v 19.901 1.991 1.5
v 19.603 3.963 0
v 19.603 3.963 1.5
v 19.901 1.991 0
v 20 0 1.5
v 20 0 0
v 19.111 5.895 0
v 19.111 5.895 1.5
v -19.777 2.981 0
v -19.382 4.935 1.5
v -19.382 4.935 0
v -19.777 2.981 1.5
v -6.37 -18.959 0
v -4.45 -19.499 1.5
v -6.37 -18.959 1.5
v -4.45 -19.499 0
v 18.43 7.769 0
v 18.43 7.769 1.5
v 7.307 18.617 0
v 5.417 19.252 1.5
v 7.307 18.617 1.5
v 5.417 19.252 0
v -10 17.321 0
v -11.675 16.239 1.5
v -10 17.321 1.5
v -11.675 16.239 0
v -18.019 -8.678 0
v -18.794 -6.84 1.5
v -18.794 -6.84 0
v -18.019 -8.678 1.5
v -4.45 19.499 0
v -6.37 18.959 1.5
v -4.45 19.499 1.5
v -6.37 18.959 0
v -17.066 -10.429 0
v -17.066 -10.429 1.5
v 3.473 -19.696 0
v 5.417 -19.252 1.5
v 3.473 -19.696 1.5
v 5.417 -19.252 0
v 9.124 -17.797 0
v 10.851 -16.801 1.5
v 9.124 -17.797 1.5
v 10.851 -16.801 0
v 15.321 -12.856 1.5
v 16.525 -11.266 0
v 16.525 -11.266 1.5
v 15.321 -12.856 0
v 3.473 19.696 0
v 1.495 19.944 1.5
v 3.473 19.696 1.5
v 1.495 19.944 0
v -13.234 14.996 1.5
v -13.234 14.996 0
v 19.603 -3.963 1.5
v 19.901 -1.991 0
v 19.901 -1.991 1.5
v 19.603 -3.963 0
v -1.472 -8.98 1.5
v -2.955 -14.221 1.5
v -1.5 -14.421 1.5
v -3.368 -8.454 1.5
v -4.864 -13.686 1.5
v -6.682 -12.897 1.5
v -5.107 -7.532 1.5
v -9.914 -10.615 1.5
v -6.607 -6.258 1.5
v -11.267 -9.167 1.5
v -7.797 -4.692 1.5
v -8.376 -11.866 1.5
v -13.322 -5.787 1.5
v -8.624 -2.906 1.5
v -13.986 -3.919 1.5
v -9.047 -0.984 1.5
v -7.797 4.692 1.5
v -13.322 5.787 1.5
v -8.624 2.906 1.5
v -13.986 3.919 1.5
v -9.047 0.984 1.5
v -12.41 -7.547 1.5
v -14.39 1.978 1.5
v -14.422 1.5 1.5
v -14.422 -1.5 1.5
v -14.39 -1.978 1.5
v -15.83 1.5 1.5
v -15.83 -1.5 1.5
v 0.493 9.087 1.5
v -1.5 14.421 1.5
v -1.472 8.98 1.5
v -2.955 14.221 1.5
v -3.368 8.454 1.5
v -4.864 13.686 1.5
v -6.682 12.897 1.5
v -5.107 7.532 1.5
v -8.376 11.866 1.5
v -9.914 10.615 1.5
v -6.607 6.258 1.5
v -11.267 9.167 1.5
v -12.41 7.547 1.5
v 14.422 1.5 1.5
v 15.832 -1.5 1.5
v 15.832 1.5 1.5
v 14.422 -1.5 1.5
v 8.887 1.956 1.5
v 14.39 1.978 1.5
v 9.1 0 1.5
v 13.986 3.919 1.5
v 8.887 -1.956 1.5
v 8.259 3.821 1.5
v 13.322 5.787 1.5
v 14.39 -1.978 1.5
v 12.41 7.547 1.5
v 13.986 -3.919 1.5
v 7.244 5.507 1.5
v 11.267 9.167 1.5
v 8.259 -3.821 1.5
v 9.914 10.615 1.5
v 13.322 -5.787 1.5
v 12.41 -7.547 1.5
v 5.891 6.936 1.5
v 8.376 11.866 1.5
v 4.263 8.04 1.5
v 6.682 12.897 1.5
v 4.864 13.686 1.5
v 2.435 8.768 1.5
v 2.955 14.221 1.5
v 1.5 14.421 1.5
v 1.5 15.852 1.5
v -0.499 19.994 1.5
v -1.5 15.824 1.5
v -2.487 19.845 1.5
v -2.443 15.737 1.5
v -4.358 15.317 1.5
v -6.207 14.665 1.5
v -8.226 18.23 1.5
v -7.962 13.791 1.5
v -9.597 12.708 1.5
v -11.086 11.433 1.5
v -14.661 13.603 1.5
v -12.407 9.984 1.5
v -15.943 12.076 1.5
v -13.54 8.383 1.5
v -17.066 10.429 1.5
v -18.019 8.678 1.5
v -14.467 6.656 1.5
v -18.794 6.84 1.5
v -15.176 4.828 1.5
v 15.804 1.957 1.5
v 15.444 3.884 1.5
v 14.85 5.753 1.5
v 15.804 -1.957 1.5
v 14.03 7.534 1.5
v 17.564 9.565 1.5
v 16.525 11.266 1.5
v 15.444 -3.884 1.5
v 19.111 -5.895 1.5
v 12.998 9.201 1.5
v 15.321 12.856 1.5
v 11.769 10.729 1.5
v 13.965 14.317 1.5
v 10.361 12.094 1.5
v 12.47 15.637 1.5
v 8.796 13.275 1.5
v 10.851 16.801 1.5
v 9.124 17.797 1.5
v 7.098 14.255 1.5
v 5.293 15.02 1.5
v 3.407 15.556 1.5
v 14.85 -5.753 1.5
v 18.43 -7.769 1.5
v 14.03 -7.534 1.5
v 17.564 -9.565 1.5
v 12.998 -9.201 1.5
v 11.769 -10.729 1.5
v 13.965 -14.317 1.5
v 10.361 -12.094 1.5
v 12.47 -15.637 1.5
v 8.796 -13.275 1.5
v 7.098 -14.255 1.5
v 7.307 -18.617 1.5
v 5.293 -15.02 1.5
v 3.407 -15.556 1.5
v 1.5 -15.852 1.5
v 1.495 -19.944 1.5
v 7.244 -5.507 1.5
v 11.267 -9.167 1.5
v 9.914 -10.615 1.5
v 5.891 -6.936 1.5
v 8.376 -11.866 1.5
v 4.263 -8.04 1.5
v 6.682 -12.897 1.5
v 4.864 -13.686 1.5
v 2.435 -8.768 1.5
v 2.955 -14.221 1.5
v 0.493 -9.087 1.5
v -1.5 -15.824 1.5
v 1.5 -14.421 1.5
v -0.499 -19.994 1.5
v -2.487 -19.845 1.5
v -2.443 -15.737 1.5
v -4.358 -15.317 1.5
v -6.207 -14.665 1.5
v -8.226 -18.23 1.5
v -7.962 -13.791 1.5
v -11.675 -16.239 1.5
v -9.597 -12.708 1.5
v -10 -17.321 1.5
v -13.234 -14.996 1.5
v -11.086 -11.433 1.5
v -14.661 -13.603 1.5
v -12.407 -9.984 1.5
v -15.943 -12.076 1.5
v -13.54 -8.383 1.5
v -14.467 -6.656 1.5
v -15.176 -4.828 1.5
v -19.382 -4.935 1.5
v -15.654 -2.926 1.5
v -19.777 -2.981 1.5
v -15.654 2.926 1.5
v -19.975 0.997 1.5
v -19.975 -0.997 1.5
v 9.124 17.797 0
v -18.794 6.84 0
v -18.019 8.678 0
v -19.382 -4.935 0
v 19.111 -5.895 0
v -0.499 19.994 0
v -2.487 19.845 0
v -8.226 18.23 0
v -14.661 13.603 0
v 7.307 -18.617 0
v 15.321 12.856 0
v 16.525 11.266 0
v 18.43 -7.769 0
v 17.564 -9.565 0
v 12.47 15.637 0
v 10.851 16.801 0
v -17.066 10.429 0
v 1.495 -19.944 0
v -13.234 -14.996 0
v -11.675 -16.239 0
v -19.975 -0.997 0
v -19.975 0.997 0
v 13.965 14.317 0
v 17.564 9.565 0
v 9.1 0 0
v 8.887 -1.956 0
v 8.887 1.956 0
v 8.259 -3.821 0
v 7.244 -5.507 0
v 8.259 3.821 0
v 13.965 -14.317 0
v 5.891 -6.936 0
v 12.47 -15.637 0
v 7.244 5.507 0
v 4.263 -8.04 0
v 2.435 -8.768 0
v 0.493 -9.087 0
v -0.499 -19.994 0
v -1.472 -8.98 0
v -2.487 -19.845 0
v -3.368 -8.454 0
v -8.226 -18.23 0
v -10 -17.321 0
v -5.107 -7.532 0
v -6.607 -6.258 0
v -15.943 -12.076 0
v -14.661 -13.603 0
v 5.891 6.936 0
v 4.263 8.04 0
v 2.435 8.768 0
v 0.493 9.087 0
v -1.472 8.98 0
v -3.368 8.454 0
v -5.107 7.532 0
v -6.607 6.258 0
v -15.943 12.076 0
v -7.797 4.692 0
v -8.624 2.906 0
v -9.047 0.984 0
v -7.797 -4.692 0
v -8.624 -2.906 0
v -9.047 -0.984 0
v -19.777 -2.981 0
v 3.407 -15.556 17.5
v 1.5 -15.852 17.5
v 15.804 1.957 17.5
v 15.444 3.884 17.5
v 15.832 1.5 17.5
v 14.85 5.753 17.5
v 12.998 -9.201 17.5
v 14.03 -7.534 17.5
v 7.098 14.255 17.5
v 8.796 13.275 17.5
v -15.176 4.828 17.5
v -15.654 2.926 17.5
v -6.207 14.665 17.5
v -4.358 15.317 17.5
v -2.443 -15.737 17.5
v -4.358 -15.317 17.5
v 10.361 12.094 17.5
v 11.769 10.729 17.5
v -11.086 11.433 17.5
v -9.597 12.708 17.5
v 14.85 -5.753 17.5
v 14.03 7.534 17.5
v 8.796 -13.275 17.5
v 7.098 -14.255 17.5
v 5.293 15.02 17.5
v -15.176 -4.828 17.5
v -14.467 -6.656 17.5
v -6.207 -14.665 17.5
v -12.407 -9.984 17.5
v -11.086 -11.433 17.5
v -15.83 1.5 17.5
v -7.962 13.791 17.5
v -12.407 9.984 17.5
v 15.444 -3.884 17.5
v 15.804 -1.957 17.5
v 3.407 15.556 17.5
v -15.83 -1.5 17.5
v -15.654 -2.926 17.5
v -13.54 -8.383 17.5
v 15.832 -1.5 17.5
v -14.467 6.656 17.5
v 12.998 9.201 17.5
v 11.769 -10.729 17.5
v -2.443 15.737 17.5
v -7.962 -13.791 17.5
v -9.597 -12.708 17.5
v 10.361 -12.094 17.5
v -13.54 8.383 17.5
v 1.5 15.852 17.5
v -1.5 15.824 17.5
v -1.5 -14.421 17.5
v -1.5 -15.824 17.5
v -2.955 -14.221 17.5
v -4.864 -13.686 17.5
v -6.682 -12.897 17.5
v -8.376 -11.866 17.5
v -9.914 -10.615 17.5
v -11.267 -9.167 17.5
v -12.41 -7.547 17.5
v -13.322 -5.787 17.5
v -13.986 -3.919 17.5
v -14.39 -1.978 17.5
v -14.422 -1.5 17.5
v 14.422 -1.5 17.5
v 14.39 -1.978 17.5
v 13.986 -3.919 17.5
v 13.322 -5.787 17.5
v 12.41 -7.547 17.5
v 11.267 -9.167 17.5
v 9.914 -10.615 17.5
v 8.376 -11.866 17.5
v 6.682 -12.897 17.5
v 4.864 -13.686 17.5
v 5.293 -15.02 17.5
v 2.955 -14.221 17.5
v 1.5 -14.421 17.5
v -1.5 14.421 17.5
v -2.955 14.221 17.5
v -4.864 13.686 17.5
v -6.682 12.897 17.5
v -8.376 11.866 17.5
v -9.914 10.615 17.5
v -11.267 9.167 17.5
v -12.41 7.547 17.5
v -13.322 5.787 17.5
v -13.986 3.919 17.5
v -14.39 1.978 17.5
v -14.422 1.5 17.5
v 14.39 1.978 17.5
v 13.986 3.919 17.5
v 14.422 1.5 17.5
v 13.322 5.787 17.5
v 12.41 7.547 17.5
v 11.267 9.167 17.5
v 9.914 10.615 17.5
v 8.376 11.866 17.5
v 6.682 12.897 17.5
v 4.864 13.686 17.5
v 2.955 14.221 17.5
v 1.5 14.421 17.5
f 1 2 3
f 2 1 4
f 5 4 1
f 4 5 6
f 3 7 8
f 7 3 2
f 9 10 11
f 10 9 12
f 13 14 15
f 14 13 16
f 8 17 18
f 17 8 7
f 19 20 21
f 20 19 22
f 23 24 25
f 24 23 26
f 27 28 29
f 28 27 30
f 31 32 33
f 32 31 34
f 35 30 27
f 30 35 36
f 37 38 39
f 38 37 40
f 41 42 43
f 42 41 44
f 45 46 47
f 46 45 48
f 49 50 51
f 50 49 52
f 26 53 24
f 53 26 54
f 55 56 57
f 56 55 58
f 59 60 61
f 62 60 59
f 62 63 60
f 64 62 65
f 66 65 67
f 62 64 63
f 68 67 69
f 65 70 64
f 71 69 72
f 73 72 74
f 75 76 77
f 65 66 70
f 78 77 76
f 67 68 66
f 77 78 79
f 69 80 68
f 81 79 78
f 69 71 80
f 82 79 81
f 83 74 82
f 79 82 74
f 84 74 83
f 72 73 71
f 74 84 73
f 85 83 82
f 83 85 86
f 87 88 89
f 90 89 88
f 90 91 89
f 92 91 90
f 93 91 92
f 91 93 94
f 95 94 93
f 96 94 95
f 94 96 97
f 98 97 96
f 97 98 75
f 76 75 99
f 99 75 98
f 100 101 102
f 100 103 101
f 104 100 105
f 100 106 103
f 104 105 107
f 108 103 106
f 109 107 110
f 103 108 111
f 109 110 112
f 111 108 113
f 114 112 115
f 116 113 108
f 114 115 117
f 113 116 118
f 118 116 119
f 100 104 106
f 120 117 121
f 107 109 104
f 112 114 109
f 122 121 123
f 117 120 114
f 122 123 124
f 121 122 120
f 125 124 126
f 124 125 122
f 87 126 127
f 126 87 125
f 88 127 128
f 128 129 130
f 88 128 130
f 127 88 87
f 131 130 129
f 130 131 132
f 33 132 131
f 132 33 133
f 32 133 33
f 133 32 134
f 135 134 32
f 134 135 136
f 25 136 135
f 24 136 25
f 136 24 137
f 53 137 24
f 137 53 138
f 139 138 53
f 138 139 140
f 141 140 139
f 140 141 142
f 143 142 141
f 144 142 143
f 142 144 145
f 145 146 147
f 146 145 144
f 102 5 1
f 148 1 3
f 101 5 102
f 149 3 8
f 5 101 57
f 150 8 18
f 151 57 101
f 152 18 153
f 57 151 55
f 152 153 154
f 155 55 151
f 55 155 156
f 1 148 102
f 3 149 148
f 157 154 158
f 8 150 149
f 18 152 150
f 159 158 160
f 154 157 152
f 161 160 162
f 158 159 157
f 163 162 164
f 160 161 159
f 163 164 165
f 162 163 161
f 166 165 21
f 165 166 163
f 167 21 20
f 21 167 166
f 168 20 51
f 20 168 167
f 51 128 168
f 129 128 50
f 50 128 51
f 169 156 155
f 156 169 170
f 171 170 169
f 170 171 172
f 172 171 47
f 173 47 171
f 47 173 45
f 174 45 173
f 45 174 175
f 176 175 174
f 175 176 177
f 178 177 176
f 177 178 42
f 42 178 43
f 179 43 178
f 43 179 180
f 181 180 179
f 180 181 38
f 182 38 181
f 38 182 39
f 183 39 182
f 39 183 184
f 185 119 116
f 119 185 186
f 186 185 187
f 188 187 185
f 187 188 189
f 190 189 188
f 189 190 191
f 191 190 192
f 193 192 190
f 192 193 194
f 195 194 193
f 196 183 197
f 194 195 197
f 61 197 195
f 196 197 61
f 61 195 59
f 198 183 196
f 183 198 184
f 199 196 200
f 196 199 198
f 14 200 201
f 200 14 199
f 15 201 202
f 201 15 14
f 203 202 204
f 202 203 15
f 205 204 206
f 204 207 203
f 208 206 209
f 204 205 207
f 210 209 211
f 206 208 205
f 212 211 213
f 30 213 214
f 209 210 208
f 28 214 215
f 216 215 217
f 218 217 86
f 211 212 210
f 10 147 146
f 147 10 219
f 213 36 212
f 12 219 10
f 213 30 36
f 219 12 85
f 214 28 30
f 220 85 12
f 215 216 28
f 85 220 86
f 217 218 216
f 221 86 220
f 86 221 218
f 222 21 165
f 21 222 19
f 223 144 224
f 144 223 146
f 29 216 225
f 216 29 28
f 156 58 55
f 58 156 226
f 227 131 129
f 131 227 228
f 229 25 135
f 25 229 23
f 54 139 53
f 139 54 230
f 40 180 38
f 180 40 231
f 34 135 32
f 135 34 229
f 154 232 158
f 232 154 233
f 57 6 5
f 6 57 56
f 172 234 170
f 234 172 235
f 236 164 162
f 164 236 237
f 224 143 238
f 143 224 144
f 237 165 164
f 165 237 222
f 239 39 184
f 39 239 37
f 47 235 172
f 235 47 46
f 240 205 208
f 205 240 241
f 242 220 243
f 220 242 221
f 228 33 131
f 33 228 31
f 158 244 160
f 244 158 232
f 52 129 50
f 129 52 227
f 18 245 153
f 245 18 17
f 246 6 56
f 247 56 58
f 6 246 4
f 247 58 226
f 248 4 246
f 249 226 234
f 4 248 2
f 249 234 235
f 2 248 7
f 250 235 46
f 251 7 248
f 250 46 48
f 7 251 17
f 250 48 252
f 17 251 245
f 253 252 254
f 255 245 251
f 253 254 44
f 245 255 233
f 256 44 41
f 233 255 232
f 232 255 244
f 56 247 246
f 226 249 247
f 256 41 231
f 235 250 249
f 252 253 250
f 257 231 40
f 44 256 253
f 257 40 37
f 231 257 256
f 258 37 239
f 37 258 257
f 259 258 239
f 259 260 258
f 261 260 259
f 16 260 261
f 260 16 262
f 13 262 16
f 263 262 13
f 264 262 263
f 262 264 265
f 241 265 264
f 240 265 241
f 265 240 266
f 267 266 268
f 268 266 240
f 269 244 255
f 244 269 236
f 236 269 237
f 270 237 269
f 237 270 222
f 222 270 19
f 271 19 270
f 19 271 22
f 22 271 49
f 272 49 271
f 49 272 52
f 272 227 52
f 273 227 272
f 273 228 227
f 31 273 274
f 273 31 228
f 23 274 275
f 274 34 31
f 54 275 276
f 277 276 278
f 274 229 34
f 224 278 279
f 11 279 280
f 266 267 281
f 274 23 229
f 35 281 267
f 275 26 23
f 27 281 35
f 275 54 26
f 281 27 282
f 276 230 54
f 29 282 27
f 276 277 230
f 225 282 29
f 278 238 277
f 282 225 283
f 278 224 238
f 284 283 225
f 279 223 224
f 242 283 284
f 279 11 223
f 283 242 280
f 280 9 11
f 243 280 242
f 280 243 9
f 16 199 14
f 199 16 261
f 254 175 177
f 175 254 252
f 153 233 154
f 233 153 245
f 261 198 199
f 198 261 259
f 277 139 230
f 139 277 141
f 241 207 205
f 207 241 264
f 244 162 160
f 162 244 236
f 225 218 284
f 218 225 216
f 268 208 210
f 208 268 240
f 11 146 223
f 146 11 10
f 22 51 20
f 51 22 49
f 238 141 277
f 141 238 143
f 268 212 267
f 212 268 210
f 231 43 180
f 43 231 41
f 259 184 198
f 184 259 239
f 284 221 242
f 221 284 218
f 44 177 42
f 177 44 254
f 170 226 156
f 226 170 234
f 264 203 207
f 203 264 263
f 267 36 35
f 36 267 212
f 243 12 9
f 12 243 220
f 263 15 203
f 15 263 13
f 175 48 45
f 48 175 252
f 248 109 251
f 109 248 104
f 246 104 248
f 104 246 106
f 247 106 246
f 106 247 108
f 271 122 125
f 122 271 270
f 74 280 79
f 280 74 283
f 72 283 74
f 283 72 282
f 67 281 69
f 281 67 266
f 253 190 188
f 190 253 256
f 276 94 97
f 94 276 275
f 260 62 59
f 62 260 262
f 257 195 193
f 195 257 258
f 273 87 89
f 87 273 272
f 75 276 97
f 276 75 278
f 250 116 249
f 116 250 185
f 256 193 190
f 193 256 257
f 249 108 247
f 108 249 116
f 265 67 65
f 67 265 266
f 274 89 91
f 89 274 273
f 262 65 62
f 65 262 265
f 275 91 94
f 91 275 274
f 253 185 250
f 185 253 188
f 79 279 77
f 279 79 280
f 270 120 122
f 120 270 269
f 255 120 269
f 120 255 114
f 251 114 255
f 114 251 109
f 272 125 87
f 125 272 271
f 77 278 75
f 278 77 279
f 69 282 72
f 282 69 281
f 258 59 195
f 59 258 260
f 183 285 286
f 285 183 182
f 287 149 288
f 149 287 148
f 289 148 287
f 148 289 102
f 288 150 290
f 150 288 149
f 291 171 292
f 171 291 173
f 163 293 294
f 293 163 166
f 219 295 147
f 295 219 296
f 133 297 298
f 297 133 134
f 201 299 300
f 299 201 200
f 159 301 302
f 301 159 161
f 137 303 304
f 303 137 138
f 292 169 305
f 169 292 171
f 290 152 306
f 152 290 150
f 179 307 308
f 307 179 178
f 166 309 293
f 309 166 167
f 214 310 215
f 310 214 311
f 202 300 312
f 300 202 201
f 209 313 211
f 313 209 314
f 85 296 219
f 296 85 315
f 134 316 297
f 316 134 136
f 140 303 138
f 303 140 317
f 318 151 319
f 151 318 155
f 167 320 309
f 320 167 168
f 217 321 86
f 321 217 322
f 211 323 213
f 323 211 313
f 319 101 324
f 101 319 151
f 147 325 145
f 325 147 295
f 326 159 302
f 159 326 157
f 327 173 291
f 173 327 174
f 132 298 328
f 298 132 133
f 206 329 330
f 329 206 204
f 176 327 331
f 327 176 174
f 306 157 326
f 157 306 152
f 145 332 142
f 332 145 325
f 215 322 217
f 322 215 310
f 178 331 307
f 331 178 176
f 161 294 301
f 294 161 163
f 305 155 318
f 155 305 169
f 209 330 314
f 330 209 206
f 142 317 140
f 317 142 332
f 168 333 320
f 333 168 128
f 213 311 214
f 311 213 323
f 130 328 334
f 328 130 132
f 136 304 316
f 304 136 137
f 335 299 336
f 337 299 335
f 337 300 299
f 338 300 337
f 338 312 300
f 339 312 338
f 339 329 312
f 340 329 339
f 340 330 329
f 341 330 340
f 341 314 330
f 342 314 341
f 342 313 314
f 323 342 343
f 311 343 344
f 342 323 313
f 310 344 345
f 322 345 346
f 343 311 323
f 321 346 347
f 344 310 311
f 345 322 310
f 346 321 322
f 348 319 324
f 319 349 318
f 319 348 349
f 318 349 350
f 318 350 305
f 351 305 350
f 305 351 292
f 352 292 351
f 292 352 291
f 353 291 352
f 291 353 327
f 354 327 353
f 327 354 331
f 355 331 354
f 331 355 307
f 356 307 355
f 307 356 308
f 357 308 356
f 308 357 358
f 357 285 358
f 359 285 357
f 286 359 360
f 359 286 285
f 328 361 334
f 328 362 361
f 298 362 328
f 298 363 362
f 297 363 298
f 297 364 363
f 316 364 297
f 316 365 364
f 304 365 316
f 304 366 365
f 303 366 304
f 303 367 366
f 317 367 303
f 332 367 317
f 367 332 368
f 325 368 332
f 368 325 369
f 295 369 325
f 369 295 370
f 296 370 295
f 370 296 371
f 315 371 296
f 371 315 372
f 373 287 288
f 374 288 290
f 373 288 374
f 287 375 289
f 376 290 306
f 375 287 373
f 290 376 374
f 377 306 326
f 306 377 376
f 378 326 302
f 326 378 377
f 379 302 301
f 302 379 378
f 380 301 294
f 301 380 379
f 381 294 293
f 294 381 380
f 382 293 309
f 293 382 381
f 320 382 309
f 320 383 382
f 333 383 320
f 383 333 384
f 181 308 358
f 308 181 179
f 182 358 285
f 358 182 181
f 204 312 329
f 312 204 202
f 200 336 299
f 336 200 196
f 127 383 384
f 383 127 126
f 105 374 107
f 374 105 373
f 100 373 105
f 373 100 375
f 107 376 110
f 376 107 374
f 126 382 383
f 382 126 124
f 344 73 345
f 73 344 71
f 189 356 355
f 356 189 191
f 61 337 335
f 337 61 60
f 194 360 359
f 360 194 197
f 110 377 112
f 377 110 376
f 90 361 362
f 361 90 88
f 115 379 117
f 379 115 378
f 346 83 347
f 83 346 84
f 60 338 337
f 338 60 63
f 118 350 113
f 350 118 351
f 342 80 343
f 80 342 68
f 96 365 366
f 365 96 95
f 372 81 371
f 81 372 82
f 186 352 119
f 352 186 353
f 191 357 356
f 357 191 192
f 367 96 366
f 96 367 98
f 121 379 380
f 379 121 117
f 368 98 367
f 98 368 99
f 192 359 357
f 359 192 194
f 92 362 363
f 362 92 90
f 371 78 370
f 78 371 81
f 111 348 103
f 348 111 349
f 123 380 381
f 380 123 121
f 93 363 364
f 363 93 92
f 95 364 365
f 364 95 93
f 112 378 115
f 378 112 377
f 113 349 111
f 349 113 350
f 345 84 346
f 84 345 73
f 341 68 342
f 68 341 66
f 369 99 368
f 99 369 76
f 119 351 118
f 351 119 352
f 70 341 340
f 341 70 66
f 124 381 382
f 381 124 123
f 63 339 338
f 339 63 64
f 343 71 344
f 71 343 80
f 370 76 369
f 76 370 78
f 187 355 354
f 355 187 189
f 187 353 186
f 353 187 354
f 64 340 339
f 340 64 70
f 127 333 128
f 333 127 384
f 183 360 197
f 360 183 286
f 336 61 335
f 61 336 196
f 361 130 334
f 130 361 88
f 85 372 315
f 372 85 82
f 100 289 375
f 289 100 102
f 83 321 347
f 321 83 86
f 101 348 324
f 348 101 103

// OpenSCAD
 SpoolSize = 31.85;
 TabThickness = 1.4;
 BackplateRim = 8.25;
 BackplateThickness = 2.1;
 TabGap = 3;
 TabDepth = 16;
 SpoolRodSize = 18.1;
 Tolerance = 0.1;
 
 TabSize = TabThickness *2;
 
 union(){
     difference(){
        cylinder(h = 1.5,d = SpoolSize + BackplateRim - Tolerance, $fa = 0.1);
        cylinder(h = 1.5,d = SpoolRodSize + Tolerance, $fa = 0.1);
    };
    
    translate( v = [0,0,1.5] ){
        difference(){
                difference(){
                    cylinder(h = TabDepth, d = SpoolSize, $fa = 0.1);
                    cylinder(h = TabDepth, d = (SpoolSize - TabSize), $fa = 0.1);
                }
                translate( v = [- .5 * TabGap,-.5 * SpoolSize,0])
                    cube(size = [TabGap,SpoolSize,TabDepth]);
                translate( v = [-.5 * SpoolSize,-.5 * TabGap,0])
                    cube(size = [SpoolSize,TabGap,TabDepth]);
                    
            }
    }
}
